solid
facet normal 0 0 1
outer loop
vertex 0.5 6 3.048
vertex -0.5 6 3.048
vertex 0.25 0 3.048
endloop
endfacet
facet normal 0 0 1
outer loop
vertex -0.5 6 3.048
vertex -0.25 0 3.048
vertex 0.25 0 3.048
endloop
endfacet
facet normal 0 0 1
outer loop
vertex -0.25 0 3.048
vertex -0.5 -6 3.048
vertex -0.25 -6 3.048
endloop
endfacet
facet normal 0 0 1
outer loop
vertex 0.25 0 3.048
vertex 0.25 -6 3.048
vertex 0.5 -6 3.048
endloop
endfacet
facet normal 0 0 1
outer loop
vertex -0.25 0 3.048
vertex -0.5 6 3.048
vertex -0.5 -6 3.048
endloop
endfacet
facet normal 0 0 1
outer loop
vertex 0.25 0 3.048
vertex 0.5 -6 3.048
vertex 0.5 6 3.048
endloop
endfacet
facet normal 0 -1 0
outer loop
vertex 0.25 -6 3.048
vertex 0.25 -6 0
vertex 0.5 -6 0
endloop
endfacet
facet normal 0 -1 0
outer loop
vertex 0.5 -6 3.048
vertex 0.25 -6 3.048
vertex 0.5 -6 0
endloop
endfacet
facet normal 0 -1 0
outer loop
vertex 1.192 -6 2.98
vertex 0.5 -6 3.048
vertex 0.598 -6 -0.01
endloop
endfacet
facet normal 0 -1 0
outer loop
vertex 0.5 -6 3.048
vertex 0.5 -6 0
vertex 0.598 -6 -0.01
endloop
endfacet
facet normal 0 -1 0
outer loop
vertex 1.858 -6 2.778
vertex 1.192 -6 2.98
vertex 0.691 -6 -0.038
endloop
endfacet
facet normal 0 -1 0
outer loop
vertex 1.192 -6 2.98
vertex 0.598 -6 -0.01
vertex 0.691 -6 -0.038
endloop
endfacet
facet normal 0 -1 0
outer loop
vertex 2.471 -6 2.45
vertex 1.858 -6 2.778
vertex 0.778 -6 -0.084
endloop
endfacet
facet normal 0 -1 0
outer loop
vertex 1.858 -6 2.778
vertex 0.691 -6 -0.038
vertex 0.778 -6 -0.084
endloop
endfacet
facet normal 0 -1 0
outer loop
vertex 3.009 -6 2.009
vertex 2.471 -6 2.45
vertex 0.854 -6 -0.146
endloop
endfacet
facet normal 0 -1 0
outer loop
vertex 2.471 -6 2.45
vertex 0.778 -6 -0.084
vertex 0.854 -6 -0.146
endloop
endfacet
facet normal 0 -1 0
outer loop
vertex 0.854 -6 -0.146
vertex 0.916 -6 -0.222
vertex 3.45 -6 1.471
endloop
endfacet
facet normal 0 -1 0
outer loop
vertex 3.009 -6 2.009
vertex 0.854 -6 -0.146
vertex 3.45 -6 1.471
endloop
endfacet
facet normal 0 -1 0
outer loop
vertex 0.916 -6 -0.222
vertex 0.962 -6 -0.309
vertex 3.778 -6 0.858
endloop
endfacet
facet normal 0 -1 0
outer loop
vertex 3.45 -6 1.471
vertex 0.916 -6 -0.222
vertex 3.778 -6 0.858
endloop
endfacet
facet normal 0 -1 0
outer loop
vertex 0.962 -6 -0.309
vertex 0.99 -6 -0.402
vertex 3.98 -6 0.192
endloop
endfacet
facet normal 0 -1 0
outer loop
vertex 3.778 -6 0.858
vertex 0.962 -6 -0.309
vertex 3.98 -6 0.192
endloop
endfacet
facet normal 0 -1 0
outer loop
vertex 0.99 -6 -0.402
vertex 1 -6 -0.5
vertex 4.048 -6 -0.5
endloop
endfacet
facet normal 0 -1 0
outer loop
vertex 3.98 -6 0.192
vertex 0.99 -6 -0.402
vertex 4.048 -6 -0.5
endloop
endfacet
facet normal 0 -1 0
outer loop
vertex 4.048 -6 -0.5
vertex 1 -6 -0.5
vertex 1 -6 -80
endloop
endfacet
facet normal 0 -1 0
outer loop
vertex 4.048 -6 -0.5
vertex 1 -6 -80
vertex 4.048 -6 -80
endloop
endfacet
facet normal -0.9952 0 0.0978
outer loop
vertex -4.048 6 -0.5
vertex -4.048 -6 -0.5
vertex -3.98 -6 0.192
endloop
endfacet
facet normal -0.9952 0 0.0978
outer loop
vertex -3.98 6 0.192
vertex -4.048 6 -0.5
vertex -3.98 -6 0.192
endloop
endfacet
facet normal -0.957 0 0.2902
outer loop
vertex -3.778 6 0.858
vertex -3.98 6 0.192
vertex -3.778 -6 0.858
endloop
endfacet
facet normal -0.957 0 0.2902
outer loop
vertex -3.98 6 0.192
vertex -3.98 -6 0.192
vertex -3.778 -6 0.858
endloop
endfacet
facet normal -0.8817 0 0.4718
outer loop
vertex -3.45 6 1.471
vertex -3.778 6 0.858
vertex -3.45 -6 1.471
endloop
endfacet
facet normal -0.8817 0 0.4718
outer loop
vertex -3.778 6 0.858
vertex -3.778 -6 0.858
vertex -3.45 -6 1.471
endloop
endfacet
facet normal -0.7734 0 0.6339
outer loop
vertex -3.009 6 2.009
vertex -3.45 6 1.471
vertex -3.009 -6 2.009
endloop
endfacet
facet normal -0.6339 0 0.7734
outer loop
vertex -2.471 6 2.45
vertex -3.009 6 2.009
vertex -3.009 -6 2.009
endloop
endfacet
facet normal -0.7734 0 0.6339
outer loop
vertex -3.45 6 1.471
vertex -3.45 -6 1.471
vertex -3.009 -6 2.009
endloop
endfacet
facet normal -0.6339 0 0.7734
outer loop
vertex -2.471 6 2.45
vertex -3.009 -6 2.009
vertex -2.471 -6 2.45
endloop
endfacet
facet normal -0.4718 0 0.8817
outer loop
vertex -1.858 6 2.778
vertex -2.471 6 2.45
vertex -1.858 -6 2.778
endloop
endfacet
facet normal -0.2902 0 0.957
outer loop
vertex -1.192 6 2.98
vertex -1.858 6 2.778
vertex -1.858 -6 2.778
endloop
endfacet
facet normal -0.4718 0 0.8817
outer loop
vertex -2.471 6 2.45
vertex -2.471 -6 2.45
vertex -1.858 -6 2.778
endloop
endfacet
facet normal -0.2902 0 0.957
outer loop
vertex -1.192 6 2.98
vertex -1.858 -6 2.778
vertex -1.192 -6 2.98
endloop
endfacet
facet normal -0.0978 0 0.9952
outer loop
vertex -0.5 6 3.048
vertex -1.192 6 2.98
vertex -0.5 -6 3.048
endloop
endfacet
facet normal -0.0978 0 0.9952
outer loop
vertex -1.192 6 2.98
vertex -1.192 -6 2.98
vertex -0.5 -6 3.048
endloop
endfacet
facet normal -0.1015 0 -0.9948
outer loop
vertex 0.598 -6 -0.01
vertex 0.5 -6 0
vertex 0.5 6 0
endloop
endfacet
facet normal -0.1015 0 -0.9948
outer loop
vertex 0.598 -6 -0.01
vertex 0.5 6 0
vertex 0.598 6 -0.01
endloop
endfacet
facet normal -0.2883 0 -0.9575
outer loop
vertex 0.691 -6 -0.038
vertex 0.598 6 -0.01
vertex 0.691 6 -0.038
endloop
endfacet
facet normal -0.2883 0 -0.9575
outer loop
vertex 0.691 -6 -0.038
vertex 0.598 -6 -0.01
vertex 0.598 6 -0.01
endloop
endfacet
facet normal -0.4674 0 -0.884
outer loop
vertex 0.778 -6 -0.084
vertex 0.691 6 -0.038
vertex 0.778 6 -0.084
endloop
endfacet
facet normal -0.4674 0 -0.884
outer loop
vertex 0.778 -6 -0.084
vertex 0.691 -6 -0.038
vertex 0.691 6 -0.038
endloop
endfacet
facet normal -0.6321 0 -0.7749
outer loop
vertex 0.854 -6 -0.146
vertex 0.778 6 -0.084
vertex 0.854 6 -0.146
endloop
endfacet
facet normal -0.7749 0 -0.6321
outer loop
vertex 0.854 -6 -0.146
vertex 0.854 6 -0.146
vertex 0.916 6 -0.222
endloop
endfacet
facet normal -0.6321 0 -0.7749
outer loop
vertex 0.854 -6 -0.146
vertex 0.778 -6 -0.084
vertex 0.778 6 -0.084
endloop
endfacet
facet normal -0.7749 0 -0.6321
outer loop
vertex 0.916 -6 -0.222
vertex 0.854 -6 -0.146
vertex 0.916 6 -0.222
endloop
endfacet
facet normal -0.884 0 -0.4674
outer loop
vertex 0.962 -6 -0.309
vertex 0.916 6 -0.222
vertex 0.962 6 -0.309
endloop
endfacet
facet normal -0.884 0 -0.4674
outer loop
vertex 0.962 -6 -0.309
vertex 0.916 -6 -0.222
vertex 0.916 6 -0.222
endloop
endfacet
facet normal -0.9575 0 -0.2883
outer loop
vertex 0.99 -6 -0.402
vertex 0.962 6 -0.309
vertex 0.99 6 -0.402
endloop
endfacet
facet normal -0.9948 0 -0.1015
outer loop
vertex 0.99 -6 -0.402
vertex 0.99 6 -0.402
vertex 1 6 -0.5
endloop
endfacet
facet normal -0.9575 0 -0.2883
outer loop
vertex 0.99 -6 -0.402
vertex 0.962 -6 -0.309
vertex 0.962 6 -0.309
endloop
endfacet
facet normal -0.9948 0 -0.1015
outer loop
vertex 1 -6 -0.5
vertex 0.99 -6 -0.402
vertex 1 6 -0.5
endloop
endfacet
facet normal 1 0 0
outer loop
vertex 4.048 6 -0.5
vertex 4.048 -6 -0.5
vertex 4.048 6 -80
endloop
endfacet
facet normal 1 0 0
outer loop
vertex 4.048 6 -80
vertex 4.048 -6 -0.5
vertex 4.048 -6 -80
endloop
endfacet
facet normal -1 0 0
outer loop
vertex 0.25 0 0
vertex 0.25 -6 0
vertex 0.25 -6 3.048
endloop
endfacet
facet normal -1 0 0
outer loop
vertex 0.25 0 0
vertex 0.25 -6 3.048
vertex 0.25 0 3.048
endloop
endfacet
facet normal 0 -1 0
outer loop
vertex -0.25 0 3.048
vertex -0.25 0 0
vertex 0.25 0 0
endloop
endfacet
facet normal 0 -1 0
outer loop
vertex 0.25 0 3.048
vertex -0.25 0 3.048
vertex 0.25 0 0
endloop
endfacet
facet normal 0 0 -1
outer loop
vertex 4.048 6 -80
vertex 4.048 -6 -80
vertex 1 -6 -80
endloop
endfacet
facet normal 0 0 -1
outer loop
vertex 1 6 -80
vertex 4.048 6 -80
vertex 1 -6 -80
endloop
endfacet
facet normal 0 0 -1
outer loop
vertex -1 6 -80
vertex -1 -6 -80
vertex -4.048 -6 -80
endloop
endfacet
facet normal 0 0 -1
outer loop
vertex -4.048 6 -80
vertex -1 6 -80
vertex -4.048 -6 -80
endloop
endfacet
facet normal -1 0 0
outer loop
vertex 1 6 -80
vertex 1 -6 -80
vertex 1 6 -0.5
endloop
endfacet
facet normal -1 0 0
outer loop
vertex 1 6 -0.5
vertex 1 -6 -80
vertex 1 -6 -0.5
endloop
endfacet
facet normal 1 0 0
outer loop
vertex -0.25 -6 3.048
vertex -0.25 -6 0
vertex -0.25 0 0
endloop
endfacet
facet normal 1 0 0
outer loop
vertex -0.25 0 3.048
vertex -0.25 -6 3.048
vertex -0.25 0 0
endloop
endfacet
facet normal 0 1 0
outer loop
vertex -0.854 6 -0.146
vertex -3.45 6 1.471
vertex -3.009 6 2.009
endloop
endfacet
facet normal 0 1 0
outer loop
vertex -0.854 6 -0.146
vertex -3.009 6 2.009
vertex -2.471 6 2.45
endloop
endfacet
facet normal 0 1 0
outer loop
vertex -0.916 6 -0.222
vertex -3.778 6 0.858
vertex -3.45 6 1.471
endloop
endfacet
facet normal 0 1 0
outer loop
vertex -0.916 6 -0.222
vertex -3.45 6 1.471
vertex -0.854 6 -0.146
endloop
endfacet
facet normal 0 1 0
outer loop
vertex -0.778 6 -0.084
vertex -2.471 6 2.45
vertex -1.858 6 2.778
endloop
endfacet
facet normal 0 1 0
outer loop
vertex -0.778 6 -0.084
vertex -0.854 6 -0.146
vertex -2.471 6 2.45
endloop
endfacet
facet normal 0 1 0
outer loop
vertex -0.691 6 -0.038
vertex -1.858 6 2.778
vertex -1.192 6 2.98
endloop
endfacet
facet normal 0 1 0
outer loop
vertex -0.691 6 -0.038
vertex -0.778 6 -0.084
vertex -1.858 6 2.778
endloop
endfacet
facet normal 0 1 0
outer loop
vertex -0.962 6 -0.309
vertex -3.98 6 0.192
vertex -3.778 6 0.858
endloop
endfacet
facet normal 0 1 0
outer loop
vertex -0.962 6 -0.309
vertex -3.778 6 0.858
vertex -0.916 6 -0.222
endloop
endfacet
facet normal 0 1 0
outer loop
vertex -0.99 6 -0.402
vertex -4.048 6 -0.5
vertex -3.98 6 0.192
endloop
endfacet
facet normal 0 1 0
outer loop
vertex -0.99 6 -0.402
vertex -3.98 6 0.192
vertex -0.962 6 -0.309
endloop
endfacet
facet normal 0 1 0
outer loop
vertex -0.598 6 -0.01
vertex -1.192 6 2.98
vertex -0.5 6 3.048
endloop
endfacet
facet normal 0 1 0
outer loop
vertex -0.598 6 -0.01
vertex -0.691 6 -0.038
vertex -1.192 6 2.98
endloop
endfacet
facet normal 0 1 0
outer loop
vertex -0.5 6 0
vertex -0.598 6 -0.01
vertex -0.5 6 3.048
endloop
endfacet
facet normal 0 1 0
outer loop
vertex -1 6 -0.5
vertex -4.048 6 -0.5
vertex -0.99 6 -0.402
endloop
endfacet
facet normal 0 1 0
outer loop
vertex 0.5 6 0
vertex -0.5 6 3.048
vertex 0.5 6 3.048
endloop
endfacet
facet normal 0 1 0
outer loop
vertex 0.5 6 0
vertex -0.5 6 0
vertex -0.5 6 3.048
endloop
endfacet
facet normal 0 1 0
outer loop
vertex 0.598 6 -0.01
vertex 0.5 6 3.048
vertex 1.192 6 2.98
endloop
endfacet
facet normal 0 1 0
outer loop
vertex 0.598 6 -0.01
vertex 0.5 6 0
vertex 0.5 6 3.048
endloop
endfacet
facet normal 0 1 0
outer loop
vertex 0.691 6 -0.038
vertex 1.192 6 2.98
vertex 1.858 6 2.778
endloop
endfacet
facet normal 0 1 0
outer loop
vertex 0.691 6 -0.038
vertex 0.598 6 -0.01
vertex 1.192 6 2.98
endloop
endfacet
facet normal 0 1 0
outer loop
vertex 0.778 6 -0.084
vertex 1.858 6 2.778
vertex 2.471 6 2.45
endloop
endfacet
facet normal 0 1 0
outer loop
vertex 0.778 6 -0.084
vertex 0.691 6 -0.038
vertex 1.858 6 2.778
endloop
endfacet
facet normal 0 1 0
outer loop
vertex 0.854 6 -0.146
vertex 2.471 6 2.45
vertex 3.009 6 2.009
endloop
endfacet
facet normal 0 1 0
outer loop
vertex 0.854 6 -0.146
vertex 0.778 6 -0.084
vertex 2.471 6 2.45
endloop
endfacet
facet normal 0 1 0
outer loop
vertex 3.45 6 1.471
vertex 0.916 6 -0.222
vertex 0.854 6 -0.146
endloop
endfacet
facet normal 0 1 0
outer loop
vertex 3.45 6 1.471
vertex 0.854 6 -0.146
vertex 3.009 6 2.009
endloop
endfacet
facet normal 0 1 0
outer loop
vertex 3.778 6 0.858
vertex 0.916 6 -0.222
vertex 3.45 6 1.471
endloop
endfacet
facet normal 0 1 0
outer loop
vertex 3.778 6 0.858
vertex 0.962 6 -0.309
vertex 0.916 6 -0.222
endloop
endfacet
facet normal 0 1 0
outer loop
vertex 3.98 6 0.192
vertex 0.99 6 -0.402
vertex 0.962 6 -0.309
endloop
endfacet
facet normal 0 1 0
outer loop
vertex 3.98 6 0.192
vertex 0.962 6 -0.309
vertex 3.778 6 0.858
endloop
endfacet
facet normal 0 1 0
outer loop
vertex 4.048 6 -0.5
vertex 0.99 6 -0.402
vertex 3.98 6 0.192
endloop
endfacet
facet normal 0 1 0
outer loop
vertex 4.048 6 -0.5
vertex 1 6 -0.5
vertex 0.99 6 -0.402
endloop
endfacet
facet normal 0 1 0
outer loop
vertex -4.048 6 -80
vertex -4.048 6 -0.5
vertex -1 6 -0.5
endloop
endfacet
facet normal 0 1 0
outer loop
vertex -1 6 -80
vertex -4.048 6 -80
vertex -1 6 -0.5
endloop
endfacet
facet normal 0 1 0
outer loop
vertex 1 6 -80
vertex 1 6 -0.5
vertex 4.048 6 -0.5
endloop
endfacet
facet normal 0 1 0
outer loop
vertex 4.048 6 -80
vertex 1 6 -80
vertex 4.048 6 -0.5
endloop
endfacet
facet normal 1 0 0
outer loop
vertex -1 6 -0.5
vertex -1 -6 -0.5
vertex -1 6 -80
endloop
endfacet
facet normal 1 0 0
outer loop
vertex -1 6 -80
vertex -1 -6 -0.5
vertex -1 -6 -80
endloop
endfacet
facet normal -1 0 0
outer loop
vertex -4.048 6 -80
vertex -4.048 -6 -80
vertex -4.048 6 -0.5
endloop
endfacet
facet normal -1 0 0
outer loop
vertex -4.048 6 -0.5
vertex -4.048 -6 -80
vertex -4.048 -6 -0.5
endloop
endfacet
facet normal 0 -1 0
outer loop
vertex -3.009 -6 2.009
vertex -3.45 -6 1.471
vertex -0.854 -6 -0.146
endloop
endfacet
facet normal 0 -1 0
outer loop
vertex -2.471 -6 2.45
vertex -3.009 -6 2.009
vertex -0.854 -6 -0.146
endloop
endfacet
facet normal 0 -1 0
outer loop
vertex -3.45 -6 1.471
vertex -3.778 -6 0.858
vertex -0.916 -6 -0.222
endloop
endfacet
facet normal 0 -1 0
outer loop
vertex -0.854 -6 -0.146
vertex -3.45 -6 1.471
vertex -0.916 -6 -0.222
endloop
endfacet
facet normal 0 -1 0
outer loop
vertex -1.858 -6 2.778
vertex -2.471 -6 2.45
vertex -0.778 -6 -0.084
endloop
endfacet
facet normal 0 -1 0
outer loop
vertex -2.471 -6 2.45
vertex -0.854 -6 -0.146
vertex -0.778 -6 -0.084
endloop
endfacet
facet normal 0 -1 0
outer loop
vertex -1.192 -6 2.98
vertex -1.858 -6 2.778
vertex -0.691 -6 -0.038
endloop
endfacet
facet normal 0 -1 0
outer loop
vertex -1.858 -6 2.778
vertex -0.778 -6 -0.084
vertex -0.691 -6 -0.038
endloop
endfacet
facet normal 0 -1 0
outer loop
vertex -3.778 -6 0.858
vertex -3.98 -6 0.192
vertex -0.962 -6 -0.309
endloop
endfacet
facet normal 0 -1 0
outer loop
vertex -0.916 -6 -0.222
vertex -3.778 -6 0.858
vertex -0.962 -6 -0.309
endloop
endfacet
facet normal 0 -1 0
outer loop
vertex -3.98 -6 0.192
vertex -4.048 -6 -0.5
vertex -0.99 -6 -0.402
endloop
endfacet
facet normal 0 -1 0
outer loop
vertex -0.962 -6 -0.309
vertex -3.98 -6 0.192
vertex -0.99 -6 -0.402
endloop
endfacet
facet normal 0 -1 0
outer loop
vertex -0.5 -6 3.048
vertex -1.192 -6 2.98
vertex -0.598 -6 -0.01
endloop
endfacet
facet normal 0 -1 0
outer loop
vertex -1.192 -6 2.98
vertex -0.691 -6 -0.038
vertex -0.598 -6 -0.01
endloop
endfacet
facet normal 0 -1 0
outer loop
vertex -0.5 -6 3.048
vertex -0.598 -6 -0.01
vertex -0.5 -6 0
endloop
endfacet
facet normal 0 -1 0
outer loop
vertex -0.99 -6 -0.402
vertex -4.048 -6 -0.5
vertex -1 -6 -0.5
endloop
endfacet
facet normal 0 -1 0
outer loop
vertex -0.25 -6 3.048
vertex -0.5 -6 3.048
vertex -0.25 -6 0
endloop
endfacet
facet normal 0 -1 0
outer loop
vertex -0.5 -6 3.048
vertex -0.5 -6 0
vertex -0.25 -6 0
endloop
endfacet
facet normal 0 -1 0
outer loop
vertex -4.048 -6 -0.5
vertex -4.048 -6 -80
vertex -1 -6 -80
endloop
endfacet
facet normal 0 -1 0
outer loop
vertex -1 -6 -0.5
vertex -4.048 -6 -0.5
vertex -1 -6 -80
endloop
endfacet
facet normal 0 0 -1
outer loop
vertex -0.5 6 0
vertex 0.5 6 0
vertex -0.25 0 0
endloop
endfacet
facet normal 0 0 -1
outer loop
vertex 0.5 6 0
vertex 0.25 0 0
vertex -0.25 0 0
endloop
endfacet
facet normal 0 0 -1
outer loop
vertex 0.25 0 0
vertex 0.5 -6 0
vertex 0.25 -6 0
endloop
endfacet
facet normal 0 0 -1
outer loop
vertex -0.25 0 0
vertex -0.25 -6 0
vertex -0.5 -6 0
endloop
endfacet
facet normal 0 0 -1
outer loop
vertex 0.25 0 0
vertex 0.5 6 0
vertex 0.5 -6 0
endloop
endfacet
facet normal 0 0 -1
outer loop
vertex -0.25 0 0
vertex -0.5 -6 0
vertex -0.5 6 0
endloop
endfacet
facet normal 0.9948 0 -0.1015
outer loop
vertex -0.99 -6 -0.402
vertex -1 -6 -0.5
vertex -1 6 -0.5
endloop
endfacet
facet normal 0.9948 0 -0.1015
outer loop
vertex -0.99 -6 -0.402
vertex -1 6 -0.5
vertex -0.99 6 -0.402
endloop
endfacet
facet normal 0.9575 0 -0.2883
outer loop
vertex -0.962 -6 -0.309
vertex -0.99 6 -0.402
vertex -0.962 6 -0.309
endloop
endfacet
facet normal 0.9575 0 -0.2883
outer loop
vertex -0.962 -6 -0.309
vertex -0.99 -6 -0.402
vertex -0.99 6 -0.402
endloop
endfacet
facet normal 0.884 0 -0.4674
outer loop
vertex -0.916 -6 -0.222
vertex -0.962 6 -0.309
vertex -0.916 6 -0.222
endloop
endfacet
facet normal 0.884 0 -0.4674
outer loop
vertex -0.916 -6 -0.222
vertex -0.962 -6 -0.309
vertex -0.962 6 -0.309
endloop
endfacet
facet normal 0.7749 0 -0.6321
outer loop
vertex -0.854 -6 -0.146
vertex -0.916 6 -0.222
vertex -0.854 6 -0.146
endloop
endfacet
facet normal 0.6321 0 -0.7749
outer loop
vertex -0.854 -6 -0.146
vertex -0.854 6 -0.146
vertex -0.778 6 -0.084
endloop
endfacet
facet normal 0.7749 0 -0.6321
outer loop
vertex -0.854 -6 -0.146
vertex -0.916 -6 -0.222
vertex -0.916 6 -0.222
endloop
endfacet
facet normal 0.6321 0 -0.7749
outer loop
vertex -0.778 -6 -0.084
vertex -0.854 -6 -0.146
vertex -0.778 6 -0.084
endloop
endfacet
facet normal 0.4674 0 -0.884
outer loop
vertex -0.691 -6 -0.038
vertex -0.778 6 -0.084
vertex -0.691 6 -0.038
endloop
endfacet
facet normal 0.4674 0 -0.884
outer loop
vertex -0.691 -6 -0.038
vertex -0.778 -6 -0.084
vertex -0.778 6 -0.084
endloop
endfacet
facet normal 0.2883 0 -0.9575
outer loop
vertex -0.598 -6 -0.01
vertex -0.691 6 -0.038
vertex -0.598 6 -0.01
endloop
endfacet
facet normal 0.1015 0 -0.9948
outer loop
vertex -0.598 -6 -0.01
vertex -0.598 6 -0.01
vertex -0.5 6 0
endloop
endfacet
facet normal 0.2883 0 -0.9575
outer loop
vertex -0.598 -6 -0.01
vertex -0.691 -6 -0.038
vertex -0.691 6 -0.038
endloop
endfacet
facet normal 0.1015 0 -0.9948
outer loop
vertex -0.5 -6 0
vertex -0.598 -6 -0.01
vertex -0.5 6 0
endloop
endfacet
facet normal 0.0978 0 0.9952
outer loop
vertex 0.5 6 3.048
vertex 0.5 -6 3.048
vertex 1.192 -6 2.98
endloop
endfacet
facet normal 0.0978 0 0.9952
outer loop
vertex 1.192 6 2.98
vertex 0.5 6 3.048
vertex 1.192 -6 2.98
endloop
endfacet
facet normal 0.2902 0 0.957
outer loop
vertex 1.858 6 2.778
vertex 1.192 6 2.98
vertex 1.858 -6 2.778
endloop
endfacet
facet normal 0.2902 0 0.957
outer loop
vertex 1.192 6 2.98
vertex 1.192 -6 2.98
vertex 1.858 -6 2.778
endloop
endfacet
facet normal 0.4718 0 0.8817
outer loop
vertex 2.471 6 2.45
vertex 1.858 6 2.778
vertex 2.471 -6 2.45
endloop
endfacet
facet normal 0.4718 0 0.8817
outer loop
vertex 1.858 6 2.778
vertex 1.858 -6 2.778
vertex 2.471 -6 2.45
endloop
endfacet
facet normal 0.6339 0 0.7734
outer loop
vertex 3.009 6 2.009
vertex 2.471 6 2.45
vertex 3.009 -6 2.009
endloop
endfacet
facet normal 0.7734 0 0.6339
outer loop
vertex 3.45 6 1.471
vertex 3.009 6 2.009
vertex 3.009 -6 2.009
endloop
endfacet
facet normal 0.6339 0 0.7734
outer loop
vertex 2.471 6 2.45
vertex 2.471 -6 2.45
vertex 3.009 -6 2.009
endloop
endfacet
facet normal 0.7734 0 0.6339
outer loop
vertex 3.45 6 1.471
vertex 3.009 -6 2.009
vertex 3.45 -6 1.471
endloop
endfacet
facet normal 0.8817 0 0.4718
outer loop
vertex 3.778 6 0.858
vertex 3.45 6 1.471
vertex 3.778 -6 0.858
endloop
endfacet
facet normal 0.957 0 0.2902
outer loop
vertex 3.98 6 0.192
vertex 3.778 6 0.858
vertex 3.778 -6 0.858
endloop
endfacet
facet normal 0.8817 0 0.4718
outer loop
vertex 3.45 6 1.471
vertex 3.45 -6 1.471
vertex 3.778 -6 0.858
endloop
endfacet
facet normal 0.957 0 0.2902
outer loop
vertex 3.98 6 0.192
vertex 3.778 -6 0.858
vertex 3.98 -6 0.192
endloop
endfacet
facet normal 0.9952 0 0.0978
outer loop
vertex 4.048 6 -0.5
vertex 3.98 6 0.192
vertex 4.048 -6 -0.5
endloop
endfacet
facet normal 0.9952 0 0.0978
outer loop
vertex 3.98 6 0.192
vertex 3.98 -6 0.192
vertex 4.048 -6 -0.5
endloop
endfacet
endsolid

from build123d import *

# Parameters (mm, degrees)
SKETCH2_W               = 2
SKETCH2_H               = 80
BOSS_EXTRUDE1_DEPTH     = 6
CONVERT_SOLID1_START    = -6
CONVERT_SOLID1_DEPTH    = 12
CONVERT_SOLID1_2_DEPTH  = 12
CUT_EXTRUDE1_DEPTH      = 81.326747127
CUT_EXTRUDE1_DEPTH_BACK = 81.326747127
SKETCH7_W               = 0.5
SKETCH7_H               = 6


# Read off the part's stored shape, not the designer's step: SharpBend1
with BuildPart() as part:
    # Sketch2 → Boss-Extrude1 (new, symmetric)
    with BuildSketch(Plane(origin=(0, 0, 0), x_dir=(1, 0, 0), z_dir=(0, 1, 0))):
        with Locations((0, 40)):
            Rectangle(SKETCH2_W, SKETCH2_H)
    extrude(amount=BOSS_EXTRUDE1_DEPTH, both=True)

    # Convert-Solid1 outline → Convert-Solid1 (cut)
    with BuildSketch(Plane(origin=(0, 0, 0), x_dir=(1, 0, 0), z_dir=(0, 1, 0)).offset(CONVERT_SOLID1_START)):
        with BuildLine():
            Line((1, 0.5), (1, 80))
            Line((1, 80), (-1, 80))
            Line((-1, 80), (-1, 0.5))
            ThreePointArc((-1, 0.5), (-0.853553391, 0.146446609), (-0.5, 0))
            Line((-0.5, 0), (0.5, 0))
            ThreePointArc((0.5, 0), (0.853553391, 0.146446609), (1, 0.5))
        make_face()
    extrude(amount=CONVERT_SOLID1_DEPTH, mode=Mode.SUBTRACT)

    # Convert-Solid1 2 outline → Convert-Solid1 2 (add)
    with BuildSketch(Plane(origin=(0, 0, 0), x_dir=(1, 0, 0), z_dir=(0, 1, 0)).offset(CONVERT_SOLID1_START)):
        with BuildLine():
            Line((4.048, 0.5), (4.048, 80))
            Line((4.048, 80), (1, 80))
            Line((1, 80), (1, 0))
            Line((1, 0), (-1, 0))
            Line((-1, 0), (-1, 80))
            Line((-1, 80), (-4.048, 80))
            Line((-4.048, 80), (-4.048, 0.5))
            ThreePointArc((-4.048, 0.5), (-3.00881486, -2.00881486), (-0.5, -3.048))
            Line((-0.5, -3.048), (0.5, -3.048))
            ThreePointArc((0.5, -3.048), (3.00881486, -2.00881486), (4.048, 0.5))
        make_face()
    extrude(amount=CONVERT_SOLID1_2_DEPTH)

    # Sketch7 → Cut-Extrude1 (cut, two sides: drawn at the far end of the back side and taken through both)
    with BuildSketch(Plane.XY.offset(-CUT_EXTRUDE1_DEPTH_BACK)):
        with Locations((0, -3)):
            Rectangle(SKETCH7_W, SKETCH7_H)
    extrude(amount=CUT_EXTRUDE1_DEPTH + CUT_EXTRUDE1_DEPTH_BACK, mode=Mode.SUBTRACT)


solid = part.part
